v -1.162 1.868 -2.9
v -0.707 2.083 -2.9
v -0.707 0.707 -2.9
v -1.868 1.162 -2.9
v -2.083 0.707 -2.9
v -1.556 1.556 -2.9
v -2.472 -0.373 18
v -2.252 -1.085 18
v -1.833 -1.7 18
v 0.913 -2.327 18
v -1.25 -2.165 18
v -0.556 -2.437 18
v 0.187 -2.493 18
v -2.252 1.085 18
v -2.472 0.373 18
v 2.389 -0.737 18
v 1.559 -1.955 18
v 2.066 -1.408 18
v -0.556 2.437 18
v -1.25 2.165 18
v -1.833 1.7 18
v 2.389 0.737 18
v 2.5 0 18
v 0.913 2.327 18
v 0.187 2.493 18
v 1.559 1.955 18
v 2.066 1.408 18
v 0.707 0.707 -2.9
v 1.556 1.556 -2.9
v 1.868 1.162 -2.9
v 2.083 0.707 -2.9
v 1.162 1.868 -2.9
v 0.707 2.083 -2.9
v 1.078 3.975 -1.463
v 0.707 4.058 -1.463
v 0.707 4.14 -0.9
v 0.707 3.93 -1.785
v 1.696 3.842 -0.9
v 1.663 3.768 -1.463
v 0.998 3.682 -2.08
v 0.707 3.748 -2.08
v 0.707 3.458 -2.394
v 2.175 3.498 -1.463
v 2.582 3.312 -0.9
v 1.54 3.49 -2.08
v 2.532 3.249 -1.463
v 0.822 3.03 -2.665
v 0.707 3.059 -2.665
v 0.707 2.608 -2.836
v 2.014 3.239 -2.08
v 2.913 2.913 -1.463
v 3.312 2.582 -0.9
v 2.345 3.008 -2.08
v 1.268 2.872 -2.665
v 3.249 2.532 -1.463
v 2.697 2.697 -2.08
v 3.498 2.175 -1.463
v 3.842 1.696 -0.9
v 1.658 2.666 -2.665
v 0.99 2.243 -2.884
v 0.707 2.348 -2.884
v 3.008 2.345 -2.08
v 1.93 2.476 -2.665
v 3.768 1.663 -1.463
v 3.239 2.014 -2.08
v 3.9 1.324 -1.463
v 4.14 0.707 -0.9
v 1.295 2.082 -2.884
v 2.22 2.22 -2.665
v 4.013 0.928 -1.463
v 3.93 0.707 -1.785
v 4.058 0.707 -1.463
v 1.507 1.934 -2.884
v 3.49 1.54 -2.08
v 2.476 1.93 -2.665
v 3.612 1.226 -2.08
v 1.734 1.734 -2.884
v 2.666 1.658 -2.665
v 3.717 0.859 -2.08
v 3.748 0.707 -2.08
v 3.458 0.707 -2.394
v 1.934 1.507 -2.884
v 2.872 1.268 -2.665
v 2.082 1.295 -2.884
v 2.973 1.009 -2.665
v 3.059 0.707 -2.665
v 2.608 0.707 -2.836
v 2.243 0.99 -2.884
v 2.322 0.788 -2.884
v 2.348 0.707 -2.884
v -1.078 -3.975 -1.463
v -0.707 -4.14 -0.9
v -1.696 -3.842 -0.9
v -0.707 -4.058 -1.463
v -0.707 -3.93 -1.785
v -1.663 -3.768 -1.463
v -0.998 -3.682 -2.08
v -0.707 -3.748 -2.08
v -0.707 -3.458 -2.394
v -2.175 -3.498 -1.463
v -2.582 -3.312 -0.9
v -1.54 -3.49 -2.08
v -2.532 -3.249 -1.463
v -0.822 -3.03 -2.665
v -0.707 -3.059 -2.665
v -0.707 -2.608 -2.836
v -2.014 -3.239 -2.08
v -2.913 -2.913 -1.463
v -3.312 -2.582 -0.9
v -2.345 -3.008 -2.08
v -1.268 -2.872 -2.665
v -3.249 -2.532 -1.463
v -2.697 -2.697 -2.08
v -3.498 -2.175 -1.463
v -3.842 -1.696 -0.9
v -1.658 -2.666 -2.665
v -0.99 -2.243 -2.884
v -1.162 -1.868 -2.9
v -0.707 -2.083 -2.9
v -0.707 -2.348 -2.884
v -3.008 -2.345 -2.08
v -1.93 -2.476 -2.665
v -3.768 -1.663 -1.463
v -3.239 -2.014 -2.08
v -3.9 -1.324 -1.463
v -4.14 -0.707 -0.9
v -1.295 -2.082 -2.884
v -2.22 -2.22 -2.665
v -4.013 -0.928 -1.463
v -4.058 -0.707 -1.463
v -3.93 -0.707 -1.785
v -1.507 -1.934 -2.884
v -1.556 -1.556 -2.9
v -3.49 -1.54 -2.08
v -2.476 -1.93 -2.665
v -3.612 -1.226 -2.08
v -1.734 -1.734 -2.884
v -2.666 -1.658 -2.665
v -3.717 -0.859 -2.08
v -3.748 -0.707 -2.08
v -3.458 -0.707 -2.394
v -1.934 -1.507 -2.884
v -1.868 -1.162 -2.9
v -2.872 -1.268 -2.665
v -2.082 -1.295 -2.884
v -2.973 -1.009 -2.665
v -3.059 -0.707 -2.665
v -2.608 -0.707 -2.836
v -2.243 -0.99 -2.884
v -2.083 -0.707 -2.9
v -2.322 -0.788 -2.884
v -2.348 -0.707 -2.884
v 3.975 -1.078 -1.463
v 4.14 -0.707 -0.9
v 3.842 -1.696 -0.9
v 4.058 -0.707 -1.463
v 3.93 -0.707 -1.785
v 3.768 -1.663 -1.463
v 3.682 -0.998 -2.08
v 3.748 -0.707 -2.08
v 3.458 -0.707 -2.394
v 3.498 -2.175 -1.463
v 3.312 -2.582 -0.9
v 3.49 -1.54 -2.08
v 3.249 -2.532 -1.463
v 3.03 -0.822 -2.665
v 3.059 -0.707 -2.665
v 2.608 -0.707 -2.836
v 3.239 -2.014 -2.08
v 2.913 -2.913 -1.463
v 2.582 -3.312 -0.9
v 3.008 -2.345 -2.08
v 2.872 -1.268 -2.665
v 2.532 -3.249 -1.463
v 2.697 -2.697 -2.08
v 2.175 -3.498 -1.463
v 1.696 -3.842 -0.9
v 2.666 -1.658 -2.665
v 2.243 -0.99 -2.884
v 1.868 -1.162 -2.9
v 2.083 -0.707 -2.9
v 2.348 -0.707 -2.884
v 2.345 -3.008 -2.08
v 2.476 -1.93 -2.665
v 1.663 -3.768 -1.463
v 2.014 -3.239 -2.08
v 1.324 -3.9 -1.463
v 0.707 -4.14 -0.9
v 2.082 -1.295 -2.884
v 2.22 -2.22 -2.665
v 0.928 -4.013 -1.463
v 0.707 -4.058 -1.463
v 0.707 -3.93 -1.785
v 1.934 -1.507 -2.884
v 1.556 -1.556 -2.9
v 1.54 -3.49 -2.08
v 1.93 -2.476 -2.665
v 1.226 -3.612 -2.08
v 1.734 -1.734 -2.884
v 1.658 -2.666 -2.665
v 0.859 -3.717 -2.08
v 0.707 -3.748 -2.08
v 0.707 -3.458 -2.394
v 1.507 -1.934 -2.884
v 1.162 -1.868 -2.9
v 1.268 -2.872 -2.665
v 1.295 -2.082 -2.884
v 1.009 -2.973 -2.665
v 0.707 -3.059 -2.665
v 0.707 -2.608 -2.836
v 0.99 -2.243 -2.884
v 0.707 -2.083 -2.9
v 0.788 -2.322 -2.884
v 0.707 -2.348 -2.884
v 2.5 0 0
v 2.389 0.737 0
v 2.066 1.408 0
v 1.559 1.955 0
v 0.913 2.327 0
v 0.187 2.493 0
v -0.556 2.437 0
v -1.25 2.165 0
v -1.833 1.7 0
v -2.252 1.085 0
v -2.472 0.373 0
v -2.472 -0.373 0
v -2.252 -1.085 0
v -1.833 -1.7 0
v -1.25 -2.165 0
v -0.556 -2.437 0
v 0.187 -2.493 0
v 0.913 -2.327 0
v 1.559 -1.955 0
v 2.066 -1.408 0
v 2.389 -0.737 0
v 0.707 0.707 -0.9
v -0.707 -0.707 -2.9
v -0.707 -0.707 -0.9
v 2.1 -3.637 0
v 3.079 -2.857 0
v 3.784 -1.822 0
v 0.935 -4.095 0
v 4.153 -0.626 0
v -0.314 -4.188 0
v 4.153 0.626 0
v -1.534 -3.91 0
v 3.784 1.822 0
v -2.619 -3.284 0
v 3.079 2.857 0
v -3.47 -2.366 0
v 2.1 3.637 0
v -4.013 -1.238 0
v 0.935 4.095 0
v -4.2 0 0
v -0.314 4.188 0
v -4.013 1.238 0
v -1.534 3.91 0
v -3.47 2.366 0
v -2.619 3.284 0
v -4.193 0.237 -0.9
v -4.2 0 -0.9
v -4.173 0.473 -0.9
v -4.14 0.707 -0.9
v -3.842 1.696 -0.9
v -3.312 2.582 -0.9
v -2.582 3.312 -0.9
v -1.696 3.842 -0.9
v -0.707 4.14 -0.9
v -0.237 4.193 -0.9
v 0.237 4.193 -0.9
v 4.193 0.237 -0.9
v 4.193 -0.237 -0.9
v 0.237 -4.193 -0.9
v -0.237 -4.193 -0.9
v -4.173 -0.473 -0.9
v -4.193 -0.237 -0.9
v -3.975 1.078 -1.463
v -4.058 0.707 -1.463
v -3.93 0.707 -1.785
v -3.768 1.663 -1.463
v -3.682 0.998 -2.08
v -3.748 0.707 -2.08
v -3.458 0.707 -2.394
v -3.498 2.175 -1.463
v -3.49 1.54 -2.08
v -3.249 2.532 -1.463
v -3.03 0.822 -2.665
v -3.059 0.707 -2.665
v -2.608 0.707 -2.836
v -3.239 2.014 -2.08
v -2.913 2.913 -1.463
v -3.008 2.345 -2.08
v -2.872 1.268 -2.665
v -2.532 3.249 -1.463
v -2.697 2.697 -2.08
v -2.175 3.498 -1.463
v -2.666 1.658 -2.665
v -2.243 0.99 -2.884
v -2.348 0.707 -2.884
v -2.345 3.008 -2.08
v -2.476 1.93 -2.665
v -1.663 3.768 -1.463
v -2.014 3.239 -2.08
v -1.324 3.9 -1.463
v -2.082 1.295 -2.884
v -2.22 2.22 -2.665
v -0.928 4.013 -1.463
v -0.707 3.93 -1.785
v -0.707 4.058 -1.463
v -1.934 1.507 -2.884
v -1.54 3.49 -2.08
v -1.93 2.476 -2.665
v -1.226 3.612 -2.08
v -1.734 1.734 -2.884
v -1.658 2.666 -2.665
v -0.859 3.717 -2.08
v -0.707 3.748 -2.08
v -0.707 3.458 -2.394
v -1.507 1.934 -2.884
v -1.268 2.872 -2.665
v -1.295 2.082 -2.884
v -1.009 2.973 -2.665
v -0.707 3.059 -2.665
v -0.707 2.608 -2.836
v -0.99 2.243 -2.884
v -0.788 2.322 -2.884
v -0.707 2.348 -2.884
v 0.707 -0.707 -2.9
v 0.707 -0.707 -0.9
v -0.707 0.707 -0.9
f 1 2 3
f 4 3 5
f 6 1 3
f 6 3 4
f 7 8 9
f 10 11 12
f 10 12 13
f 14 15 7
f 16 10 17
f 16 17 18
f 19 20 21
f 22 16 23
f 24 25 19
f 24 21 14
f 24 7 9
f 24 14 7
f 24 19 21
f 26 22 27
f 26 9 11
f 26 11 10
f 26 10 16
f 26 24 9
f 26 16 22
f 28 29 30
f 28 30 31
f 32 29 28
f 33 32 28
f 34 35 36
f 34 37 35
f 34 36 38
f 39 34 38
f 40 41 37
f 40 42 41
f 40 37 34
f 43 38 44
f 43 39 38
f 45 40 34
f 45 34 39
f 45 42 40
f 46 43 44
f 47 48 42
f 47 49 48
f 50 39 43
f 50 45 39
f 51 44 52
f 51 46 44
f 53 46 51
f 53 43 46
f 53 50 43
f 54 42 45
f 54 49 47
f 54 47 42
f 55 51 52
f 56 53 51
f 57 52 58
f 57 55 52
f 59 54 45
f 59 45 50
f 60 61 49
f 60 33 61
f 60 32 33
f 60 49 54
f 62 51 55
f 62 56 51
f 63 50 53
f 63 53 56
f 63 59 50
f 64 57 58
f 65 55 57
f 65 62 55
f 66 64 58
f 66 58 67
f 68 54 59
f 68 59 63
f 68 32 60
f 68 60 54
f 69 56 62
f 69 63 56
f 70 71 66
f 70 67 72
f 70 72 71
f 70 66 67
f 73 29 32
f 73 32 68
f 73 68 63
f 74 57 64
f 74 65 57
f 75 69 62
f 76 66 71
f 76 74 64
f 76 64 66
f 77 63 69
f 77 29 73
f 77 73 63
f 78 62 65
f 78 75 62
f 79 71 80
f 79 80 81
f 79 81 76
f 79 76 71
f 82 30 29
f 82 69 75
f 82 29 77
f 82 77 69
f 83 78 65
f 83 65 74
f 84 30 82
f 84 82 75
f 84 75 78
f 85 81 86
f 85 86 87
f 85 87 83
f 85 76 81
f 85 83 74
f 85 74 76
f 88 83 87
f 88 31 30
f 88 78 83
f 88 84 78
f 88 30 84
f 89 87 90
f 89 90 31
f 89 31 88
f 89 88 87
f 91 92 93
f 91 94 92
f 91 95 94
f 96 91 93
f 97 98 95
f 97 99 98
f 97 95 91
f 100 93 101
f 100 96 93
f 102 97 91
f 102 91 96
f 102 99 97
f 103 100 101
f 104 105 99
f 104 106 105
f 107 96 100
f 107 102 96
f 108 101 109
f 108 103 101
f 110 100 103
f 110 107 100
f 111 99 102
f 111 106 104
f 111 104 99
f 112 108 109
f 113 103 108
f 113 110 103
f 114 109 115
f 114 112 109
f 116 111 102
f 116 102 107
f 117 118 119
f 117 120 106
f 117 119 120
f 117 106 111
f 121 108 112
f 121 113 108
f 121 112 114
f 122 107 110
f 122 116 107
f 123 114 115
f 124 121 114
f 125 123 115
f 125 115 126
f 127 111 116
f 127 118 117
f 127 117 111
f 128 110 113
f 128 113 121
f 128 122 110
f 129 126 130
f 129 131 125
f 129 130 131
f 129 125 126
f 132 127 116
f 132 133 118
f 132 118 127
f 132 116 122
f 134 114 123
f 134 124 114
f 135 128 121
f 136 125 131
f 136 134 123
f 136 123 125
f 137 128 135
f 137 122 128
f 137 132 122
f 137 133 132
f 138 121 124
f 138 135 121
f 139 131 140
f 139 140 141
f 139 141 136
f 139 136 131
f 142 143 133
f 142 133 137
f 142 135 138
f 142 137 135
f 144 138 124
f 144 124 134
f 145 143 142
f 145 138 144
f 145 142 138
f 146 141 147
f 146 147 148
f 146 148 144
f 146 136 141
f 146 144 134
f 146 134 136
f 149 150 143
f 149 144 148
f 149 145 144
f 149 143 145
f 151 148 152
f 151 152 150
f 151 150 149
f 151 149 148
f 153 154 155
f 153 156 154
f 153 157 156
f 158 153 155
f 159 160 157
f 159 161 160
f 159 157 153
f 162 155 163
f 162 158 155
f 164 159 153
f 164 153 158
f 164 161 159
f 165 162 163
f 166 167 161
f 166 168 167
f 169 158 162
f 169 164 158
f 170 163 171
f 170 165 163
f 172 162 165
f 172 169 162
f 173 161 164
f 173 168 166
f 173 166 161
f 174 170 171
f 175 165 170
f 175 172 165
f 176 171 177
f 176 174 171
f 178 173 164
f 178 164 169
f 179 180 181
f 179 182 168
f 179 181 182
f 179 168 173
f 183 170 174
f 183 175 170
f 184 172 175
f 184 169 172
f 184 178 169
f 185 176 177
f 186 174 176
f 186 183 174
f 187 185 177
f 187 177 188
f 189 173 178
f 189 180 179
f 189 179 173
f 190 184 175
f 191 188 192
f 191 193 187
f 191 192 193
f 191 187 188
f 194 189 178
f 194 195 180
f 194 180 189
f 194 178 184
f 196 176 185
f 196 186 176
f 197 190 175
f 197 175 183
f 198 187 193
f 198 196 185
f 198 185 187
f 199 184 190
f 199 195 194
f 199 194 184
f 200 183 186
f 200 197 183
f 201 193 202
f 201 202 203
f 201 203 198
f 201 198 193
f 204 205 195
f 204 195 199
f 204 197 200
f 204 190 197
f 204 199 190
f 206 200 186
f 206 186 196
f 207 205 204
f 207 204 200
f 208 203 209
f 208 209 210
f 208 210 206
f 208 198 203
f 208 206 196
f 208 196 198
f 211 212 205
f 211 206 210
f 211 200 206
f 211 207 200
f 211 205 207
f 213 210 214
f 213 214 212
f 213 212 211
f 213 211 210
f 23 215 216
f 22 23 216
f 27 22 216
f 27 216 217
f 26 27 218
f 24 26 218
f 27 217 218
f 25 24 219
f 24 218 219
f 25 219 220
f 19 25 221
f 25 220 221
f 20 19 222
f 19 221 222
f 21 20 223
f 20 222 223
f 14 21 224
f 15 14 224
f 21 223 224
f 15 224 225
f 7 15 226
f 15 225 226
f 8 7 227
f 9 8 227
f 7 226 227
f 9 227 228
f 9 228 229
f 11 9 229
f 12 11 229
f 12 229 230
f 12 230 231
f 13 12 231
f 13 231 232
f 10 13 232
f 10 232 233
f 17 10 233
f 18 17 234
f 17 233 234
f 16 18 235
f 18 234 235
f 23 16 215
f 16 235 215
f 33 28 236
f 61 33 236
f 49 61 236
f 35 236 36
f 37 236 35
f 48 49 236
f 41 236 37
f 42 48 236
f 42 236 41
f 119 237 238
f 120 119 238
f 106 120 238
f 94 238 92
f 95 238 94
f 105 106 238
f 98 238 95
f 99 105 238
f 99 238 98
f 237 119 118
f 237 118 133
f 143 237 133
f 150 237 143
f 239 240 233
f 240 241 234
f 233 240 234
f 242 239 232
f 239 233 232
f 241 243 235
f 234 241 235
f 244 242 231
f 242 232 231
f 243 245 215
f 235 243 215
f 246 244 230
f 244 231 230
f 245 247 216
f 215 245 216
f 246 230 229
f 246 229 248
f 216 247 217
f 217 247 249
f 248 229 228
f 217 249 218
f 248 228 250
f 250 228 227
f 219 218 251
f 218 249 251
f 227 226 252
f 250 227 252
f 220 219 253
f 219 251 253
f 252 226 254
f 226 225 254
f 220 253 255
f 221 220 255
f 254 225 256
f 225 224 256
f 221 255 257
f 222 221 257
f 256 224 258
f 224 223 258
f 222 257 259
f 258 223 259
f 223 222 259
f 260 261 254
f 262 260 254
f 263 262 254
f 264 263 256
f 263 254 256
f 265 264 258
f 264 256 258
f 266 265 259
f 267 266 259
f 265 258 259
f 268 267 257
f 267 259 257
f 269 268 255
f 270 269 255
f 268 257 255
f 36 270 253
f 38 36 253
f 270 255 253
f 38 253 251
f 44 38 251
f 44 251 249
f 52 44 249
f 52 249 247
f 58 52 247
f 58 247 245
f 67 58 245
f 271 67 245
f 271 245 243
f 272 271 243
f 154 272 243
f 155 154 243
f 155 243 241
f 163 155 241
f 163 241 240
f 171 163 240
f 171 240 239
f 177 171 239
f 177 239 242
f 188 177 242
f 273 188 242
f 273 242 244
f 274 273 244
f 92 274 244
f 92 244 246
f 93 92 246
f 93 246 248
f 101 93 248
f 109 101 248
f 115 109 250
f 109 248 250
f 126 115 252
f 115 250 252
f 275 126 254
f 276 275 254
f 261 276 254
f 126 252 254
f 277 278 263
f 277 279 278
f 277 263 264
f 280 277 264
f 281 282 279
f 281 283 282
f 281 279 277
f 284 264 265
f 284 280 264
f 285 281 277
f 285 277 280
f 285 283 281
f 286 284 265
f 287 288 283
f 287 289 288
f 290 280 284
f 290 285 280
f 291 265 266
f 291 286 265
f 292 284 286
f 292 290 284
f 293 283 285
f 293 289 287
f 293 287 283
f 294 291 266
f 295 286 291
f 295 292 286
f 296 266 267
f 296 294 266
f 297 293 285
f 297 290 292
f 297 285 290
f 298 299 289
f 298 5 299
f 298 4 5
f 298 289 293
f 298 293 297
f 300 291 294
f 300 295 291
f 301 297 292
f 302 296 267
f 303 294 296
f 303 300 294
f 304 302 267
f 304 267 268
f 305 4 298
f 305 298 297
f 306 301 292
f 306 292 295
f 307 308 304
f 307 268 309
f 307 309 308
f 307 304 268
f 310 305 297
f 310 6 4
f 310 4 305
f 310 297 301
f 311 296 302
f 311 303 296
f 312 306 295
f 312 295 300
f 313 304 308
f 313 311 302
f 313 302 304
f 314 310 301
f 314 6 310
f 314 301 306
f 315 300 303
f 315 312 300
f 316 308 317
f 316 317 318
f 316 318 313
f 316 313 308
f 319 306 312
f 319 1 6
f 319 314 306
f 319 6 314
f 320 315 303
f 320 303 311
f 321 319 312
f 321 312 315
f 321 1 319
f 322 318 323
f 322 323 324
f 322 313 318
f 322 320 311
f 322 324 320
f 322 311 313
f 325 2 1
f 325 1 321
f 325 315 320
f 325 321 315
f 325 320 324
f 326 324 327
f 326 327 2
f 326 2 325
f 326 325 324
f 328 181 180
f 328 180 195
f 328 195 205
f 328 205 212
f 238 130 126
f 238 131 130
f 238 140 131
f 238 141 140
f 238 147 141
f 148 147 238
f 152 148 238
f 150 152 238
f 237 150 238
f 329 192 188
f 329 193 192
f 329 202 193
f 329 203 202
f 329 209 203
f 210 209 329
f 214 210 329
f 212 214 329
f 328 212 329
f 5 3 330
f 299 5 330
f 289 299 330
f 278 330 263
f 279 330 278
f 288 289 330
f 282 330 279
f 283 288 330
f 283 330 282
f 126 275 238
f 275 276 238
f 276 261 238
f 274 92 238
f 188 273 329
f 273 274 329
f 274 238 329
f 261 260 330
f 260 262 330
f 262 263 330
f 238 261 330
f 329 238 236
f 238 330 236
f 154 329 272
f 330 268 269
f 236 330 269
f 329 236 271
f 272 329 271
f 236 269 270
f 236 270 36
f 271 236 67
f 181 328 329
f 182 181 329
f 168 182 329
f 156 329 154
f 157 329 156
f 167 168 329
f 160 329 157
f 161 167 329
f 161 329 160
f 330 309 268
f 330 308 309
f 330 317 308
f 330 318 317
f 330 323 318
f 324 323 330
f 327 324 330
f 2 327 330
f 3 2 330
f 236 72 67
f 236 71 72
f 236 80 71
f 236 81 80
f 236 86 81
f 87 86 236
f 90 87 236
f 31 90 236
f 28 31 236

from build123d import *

# Parameters (mm, degrees)
SKETCH_1_R          = 2.5
EXTRUDE_1_DEPTH     = 18
SKETCH_2_R          = 4.2
EXTRUDE_2_DEPTH     = 2.9
FILLET_1_R          = 2
CUT_EXTRUDE_1_DEPTH = 2


with BuildPart() as part:
    # 草图1 → 凸台-拉伸1 (new body)
    with BuildSketch(Plane.XY):
        Circle(SKETCH_1_R)
    extrude(amount=EXTRUDE_1_DEPTH)

    # 草图2 → 凸台-拉伸2 (add)
    with BuildSketch(Plane(origin=(0, 0, 0), x_dir=(-1, 0, 0), z_dir=(0, 0, -1))):
        Circle(SKETCH_2_R)
    extrude(amount=EXTRUDE_2_DEPTH)

    # 圆角1
    fillet_1_edges = [part.edges().sort_by_distance(p)[0] for p in [
        (4.2, 0, -2.9),
    ]]
    fillet(fillet_1_edges, radius=FILLET_1_R)

    # 草图3 → 切除-拉伸1 (cut)
    with BuildSketch(Plane(origin=(0, 0, -2.9), x_dir=(-1, 0, 0), z_dir=(0, 0, -1))):
        Polygon((-0.707106781, 0.707106781), (-0.707106781, 6.006401657), (0.707106781, 6.006401657), (0.707106781, 0.707106781), (6.006401657, 0.707106781), (6.006401657, -0.707106781), (0.707106781, -0.707106781), (0.707106781, -6.006401657), (-0.707106781, -6.006401657), (-0.707106781, -0.707106781), (-6.006401657, -0.707106781), (-6.006401657, 0.707106781), align=None)
    extrude(amount=-CUT_EXTRUDE_1_DEPTH, mode=Mode.SUBTRACT)


solid = part.part
